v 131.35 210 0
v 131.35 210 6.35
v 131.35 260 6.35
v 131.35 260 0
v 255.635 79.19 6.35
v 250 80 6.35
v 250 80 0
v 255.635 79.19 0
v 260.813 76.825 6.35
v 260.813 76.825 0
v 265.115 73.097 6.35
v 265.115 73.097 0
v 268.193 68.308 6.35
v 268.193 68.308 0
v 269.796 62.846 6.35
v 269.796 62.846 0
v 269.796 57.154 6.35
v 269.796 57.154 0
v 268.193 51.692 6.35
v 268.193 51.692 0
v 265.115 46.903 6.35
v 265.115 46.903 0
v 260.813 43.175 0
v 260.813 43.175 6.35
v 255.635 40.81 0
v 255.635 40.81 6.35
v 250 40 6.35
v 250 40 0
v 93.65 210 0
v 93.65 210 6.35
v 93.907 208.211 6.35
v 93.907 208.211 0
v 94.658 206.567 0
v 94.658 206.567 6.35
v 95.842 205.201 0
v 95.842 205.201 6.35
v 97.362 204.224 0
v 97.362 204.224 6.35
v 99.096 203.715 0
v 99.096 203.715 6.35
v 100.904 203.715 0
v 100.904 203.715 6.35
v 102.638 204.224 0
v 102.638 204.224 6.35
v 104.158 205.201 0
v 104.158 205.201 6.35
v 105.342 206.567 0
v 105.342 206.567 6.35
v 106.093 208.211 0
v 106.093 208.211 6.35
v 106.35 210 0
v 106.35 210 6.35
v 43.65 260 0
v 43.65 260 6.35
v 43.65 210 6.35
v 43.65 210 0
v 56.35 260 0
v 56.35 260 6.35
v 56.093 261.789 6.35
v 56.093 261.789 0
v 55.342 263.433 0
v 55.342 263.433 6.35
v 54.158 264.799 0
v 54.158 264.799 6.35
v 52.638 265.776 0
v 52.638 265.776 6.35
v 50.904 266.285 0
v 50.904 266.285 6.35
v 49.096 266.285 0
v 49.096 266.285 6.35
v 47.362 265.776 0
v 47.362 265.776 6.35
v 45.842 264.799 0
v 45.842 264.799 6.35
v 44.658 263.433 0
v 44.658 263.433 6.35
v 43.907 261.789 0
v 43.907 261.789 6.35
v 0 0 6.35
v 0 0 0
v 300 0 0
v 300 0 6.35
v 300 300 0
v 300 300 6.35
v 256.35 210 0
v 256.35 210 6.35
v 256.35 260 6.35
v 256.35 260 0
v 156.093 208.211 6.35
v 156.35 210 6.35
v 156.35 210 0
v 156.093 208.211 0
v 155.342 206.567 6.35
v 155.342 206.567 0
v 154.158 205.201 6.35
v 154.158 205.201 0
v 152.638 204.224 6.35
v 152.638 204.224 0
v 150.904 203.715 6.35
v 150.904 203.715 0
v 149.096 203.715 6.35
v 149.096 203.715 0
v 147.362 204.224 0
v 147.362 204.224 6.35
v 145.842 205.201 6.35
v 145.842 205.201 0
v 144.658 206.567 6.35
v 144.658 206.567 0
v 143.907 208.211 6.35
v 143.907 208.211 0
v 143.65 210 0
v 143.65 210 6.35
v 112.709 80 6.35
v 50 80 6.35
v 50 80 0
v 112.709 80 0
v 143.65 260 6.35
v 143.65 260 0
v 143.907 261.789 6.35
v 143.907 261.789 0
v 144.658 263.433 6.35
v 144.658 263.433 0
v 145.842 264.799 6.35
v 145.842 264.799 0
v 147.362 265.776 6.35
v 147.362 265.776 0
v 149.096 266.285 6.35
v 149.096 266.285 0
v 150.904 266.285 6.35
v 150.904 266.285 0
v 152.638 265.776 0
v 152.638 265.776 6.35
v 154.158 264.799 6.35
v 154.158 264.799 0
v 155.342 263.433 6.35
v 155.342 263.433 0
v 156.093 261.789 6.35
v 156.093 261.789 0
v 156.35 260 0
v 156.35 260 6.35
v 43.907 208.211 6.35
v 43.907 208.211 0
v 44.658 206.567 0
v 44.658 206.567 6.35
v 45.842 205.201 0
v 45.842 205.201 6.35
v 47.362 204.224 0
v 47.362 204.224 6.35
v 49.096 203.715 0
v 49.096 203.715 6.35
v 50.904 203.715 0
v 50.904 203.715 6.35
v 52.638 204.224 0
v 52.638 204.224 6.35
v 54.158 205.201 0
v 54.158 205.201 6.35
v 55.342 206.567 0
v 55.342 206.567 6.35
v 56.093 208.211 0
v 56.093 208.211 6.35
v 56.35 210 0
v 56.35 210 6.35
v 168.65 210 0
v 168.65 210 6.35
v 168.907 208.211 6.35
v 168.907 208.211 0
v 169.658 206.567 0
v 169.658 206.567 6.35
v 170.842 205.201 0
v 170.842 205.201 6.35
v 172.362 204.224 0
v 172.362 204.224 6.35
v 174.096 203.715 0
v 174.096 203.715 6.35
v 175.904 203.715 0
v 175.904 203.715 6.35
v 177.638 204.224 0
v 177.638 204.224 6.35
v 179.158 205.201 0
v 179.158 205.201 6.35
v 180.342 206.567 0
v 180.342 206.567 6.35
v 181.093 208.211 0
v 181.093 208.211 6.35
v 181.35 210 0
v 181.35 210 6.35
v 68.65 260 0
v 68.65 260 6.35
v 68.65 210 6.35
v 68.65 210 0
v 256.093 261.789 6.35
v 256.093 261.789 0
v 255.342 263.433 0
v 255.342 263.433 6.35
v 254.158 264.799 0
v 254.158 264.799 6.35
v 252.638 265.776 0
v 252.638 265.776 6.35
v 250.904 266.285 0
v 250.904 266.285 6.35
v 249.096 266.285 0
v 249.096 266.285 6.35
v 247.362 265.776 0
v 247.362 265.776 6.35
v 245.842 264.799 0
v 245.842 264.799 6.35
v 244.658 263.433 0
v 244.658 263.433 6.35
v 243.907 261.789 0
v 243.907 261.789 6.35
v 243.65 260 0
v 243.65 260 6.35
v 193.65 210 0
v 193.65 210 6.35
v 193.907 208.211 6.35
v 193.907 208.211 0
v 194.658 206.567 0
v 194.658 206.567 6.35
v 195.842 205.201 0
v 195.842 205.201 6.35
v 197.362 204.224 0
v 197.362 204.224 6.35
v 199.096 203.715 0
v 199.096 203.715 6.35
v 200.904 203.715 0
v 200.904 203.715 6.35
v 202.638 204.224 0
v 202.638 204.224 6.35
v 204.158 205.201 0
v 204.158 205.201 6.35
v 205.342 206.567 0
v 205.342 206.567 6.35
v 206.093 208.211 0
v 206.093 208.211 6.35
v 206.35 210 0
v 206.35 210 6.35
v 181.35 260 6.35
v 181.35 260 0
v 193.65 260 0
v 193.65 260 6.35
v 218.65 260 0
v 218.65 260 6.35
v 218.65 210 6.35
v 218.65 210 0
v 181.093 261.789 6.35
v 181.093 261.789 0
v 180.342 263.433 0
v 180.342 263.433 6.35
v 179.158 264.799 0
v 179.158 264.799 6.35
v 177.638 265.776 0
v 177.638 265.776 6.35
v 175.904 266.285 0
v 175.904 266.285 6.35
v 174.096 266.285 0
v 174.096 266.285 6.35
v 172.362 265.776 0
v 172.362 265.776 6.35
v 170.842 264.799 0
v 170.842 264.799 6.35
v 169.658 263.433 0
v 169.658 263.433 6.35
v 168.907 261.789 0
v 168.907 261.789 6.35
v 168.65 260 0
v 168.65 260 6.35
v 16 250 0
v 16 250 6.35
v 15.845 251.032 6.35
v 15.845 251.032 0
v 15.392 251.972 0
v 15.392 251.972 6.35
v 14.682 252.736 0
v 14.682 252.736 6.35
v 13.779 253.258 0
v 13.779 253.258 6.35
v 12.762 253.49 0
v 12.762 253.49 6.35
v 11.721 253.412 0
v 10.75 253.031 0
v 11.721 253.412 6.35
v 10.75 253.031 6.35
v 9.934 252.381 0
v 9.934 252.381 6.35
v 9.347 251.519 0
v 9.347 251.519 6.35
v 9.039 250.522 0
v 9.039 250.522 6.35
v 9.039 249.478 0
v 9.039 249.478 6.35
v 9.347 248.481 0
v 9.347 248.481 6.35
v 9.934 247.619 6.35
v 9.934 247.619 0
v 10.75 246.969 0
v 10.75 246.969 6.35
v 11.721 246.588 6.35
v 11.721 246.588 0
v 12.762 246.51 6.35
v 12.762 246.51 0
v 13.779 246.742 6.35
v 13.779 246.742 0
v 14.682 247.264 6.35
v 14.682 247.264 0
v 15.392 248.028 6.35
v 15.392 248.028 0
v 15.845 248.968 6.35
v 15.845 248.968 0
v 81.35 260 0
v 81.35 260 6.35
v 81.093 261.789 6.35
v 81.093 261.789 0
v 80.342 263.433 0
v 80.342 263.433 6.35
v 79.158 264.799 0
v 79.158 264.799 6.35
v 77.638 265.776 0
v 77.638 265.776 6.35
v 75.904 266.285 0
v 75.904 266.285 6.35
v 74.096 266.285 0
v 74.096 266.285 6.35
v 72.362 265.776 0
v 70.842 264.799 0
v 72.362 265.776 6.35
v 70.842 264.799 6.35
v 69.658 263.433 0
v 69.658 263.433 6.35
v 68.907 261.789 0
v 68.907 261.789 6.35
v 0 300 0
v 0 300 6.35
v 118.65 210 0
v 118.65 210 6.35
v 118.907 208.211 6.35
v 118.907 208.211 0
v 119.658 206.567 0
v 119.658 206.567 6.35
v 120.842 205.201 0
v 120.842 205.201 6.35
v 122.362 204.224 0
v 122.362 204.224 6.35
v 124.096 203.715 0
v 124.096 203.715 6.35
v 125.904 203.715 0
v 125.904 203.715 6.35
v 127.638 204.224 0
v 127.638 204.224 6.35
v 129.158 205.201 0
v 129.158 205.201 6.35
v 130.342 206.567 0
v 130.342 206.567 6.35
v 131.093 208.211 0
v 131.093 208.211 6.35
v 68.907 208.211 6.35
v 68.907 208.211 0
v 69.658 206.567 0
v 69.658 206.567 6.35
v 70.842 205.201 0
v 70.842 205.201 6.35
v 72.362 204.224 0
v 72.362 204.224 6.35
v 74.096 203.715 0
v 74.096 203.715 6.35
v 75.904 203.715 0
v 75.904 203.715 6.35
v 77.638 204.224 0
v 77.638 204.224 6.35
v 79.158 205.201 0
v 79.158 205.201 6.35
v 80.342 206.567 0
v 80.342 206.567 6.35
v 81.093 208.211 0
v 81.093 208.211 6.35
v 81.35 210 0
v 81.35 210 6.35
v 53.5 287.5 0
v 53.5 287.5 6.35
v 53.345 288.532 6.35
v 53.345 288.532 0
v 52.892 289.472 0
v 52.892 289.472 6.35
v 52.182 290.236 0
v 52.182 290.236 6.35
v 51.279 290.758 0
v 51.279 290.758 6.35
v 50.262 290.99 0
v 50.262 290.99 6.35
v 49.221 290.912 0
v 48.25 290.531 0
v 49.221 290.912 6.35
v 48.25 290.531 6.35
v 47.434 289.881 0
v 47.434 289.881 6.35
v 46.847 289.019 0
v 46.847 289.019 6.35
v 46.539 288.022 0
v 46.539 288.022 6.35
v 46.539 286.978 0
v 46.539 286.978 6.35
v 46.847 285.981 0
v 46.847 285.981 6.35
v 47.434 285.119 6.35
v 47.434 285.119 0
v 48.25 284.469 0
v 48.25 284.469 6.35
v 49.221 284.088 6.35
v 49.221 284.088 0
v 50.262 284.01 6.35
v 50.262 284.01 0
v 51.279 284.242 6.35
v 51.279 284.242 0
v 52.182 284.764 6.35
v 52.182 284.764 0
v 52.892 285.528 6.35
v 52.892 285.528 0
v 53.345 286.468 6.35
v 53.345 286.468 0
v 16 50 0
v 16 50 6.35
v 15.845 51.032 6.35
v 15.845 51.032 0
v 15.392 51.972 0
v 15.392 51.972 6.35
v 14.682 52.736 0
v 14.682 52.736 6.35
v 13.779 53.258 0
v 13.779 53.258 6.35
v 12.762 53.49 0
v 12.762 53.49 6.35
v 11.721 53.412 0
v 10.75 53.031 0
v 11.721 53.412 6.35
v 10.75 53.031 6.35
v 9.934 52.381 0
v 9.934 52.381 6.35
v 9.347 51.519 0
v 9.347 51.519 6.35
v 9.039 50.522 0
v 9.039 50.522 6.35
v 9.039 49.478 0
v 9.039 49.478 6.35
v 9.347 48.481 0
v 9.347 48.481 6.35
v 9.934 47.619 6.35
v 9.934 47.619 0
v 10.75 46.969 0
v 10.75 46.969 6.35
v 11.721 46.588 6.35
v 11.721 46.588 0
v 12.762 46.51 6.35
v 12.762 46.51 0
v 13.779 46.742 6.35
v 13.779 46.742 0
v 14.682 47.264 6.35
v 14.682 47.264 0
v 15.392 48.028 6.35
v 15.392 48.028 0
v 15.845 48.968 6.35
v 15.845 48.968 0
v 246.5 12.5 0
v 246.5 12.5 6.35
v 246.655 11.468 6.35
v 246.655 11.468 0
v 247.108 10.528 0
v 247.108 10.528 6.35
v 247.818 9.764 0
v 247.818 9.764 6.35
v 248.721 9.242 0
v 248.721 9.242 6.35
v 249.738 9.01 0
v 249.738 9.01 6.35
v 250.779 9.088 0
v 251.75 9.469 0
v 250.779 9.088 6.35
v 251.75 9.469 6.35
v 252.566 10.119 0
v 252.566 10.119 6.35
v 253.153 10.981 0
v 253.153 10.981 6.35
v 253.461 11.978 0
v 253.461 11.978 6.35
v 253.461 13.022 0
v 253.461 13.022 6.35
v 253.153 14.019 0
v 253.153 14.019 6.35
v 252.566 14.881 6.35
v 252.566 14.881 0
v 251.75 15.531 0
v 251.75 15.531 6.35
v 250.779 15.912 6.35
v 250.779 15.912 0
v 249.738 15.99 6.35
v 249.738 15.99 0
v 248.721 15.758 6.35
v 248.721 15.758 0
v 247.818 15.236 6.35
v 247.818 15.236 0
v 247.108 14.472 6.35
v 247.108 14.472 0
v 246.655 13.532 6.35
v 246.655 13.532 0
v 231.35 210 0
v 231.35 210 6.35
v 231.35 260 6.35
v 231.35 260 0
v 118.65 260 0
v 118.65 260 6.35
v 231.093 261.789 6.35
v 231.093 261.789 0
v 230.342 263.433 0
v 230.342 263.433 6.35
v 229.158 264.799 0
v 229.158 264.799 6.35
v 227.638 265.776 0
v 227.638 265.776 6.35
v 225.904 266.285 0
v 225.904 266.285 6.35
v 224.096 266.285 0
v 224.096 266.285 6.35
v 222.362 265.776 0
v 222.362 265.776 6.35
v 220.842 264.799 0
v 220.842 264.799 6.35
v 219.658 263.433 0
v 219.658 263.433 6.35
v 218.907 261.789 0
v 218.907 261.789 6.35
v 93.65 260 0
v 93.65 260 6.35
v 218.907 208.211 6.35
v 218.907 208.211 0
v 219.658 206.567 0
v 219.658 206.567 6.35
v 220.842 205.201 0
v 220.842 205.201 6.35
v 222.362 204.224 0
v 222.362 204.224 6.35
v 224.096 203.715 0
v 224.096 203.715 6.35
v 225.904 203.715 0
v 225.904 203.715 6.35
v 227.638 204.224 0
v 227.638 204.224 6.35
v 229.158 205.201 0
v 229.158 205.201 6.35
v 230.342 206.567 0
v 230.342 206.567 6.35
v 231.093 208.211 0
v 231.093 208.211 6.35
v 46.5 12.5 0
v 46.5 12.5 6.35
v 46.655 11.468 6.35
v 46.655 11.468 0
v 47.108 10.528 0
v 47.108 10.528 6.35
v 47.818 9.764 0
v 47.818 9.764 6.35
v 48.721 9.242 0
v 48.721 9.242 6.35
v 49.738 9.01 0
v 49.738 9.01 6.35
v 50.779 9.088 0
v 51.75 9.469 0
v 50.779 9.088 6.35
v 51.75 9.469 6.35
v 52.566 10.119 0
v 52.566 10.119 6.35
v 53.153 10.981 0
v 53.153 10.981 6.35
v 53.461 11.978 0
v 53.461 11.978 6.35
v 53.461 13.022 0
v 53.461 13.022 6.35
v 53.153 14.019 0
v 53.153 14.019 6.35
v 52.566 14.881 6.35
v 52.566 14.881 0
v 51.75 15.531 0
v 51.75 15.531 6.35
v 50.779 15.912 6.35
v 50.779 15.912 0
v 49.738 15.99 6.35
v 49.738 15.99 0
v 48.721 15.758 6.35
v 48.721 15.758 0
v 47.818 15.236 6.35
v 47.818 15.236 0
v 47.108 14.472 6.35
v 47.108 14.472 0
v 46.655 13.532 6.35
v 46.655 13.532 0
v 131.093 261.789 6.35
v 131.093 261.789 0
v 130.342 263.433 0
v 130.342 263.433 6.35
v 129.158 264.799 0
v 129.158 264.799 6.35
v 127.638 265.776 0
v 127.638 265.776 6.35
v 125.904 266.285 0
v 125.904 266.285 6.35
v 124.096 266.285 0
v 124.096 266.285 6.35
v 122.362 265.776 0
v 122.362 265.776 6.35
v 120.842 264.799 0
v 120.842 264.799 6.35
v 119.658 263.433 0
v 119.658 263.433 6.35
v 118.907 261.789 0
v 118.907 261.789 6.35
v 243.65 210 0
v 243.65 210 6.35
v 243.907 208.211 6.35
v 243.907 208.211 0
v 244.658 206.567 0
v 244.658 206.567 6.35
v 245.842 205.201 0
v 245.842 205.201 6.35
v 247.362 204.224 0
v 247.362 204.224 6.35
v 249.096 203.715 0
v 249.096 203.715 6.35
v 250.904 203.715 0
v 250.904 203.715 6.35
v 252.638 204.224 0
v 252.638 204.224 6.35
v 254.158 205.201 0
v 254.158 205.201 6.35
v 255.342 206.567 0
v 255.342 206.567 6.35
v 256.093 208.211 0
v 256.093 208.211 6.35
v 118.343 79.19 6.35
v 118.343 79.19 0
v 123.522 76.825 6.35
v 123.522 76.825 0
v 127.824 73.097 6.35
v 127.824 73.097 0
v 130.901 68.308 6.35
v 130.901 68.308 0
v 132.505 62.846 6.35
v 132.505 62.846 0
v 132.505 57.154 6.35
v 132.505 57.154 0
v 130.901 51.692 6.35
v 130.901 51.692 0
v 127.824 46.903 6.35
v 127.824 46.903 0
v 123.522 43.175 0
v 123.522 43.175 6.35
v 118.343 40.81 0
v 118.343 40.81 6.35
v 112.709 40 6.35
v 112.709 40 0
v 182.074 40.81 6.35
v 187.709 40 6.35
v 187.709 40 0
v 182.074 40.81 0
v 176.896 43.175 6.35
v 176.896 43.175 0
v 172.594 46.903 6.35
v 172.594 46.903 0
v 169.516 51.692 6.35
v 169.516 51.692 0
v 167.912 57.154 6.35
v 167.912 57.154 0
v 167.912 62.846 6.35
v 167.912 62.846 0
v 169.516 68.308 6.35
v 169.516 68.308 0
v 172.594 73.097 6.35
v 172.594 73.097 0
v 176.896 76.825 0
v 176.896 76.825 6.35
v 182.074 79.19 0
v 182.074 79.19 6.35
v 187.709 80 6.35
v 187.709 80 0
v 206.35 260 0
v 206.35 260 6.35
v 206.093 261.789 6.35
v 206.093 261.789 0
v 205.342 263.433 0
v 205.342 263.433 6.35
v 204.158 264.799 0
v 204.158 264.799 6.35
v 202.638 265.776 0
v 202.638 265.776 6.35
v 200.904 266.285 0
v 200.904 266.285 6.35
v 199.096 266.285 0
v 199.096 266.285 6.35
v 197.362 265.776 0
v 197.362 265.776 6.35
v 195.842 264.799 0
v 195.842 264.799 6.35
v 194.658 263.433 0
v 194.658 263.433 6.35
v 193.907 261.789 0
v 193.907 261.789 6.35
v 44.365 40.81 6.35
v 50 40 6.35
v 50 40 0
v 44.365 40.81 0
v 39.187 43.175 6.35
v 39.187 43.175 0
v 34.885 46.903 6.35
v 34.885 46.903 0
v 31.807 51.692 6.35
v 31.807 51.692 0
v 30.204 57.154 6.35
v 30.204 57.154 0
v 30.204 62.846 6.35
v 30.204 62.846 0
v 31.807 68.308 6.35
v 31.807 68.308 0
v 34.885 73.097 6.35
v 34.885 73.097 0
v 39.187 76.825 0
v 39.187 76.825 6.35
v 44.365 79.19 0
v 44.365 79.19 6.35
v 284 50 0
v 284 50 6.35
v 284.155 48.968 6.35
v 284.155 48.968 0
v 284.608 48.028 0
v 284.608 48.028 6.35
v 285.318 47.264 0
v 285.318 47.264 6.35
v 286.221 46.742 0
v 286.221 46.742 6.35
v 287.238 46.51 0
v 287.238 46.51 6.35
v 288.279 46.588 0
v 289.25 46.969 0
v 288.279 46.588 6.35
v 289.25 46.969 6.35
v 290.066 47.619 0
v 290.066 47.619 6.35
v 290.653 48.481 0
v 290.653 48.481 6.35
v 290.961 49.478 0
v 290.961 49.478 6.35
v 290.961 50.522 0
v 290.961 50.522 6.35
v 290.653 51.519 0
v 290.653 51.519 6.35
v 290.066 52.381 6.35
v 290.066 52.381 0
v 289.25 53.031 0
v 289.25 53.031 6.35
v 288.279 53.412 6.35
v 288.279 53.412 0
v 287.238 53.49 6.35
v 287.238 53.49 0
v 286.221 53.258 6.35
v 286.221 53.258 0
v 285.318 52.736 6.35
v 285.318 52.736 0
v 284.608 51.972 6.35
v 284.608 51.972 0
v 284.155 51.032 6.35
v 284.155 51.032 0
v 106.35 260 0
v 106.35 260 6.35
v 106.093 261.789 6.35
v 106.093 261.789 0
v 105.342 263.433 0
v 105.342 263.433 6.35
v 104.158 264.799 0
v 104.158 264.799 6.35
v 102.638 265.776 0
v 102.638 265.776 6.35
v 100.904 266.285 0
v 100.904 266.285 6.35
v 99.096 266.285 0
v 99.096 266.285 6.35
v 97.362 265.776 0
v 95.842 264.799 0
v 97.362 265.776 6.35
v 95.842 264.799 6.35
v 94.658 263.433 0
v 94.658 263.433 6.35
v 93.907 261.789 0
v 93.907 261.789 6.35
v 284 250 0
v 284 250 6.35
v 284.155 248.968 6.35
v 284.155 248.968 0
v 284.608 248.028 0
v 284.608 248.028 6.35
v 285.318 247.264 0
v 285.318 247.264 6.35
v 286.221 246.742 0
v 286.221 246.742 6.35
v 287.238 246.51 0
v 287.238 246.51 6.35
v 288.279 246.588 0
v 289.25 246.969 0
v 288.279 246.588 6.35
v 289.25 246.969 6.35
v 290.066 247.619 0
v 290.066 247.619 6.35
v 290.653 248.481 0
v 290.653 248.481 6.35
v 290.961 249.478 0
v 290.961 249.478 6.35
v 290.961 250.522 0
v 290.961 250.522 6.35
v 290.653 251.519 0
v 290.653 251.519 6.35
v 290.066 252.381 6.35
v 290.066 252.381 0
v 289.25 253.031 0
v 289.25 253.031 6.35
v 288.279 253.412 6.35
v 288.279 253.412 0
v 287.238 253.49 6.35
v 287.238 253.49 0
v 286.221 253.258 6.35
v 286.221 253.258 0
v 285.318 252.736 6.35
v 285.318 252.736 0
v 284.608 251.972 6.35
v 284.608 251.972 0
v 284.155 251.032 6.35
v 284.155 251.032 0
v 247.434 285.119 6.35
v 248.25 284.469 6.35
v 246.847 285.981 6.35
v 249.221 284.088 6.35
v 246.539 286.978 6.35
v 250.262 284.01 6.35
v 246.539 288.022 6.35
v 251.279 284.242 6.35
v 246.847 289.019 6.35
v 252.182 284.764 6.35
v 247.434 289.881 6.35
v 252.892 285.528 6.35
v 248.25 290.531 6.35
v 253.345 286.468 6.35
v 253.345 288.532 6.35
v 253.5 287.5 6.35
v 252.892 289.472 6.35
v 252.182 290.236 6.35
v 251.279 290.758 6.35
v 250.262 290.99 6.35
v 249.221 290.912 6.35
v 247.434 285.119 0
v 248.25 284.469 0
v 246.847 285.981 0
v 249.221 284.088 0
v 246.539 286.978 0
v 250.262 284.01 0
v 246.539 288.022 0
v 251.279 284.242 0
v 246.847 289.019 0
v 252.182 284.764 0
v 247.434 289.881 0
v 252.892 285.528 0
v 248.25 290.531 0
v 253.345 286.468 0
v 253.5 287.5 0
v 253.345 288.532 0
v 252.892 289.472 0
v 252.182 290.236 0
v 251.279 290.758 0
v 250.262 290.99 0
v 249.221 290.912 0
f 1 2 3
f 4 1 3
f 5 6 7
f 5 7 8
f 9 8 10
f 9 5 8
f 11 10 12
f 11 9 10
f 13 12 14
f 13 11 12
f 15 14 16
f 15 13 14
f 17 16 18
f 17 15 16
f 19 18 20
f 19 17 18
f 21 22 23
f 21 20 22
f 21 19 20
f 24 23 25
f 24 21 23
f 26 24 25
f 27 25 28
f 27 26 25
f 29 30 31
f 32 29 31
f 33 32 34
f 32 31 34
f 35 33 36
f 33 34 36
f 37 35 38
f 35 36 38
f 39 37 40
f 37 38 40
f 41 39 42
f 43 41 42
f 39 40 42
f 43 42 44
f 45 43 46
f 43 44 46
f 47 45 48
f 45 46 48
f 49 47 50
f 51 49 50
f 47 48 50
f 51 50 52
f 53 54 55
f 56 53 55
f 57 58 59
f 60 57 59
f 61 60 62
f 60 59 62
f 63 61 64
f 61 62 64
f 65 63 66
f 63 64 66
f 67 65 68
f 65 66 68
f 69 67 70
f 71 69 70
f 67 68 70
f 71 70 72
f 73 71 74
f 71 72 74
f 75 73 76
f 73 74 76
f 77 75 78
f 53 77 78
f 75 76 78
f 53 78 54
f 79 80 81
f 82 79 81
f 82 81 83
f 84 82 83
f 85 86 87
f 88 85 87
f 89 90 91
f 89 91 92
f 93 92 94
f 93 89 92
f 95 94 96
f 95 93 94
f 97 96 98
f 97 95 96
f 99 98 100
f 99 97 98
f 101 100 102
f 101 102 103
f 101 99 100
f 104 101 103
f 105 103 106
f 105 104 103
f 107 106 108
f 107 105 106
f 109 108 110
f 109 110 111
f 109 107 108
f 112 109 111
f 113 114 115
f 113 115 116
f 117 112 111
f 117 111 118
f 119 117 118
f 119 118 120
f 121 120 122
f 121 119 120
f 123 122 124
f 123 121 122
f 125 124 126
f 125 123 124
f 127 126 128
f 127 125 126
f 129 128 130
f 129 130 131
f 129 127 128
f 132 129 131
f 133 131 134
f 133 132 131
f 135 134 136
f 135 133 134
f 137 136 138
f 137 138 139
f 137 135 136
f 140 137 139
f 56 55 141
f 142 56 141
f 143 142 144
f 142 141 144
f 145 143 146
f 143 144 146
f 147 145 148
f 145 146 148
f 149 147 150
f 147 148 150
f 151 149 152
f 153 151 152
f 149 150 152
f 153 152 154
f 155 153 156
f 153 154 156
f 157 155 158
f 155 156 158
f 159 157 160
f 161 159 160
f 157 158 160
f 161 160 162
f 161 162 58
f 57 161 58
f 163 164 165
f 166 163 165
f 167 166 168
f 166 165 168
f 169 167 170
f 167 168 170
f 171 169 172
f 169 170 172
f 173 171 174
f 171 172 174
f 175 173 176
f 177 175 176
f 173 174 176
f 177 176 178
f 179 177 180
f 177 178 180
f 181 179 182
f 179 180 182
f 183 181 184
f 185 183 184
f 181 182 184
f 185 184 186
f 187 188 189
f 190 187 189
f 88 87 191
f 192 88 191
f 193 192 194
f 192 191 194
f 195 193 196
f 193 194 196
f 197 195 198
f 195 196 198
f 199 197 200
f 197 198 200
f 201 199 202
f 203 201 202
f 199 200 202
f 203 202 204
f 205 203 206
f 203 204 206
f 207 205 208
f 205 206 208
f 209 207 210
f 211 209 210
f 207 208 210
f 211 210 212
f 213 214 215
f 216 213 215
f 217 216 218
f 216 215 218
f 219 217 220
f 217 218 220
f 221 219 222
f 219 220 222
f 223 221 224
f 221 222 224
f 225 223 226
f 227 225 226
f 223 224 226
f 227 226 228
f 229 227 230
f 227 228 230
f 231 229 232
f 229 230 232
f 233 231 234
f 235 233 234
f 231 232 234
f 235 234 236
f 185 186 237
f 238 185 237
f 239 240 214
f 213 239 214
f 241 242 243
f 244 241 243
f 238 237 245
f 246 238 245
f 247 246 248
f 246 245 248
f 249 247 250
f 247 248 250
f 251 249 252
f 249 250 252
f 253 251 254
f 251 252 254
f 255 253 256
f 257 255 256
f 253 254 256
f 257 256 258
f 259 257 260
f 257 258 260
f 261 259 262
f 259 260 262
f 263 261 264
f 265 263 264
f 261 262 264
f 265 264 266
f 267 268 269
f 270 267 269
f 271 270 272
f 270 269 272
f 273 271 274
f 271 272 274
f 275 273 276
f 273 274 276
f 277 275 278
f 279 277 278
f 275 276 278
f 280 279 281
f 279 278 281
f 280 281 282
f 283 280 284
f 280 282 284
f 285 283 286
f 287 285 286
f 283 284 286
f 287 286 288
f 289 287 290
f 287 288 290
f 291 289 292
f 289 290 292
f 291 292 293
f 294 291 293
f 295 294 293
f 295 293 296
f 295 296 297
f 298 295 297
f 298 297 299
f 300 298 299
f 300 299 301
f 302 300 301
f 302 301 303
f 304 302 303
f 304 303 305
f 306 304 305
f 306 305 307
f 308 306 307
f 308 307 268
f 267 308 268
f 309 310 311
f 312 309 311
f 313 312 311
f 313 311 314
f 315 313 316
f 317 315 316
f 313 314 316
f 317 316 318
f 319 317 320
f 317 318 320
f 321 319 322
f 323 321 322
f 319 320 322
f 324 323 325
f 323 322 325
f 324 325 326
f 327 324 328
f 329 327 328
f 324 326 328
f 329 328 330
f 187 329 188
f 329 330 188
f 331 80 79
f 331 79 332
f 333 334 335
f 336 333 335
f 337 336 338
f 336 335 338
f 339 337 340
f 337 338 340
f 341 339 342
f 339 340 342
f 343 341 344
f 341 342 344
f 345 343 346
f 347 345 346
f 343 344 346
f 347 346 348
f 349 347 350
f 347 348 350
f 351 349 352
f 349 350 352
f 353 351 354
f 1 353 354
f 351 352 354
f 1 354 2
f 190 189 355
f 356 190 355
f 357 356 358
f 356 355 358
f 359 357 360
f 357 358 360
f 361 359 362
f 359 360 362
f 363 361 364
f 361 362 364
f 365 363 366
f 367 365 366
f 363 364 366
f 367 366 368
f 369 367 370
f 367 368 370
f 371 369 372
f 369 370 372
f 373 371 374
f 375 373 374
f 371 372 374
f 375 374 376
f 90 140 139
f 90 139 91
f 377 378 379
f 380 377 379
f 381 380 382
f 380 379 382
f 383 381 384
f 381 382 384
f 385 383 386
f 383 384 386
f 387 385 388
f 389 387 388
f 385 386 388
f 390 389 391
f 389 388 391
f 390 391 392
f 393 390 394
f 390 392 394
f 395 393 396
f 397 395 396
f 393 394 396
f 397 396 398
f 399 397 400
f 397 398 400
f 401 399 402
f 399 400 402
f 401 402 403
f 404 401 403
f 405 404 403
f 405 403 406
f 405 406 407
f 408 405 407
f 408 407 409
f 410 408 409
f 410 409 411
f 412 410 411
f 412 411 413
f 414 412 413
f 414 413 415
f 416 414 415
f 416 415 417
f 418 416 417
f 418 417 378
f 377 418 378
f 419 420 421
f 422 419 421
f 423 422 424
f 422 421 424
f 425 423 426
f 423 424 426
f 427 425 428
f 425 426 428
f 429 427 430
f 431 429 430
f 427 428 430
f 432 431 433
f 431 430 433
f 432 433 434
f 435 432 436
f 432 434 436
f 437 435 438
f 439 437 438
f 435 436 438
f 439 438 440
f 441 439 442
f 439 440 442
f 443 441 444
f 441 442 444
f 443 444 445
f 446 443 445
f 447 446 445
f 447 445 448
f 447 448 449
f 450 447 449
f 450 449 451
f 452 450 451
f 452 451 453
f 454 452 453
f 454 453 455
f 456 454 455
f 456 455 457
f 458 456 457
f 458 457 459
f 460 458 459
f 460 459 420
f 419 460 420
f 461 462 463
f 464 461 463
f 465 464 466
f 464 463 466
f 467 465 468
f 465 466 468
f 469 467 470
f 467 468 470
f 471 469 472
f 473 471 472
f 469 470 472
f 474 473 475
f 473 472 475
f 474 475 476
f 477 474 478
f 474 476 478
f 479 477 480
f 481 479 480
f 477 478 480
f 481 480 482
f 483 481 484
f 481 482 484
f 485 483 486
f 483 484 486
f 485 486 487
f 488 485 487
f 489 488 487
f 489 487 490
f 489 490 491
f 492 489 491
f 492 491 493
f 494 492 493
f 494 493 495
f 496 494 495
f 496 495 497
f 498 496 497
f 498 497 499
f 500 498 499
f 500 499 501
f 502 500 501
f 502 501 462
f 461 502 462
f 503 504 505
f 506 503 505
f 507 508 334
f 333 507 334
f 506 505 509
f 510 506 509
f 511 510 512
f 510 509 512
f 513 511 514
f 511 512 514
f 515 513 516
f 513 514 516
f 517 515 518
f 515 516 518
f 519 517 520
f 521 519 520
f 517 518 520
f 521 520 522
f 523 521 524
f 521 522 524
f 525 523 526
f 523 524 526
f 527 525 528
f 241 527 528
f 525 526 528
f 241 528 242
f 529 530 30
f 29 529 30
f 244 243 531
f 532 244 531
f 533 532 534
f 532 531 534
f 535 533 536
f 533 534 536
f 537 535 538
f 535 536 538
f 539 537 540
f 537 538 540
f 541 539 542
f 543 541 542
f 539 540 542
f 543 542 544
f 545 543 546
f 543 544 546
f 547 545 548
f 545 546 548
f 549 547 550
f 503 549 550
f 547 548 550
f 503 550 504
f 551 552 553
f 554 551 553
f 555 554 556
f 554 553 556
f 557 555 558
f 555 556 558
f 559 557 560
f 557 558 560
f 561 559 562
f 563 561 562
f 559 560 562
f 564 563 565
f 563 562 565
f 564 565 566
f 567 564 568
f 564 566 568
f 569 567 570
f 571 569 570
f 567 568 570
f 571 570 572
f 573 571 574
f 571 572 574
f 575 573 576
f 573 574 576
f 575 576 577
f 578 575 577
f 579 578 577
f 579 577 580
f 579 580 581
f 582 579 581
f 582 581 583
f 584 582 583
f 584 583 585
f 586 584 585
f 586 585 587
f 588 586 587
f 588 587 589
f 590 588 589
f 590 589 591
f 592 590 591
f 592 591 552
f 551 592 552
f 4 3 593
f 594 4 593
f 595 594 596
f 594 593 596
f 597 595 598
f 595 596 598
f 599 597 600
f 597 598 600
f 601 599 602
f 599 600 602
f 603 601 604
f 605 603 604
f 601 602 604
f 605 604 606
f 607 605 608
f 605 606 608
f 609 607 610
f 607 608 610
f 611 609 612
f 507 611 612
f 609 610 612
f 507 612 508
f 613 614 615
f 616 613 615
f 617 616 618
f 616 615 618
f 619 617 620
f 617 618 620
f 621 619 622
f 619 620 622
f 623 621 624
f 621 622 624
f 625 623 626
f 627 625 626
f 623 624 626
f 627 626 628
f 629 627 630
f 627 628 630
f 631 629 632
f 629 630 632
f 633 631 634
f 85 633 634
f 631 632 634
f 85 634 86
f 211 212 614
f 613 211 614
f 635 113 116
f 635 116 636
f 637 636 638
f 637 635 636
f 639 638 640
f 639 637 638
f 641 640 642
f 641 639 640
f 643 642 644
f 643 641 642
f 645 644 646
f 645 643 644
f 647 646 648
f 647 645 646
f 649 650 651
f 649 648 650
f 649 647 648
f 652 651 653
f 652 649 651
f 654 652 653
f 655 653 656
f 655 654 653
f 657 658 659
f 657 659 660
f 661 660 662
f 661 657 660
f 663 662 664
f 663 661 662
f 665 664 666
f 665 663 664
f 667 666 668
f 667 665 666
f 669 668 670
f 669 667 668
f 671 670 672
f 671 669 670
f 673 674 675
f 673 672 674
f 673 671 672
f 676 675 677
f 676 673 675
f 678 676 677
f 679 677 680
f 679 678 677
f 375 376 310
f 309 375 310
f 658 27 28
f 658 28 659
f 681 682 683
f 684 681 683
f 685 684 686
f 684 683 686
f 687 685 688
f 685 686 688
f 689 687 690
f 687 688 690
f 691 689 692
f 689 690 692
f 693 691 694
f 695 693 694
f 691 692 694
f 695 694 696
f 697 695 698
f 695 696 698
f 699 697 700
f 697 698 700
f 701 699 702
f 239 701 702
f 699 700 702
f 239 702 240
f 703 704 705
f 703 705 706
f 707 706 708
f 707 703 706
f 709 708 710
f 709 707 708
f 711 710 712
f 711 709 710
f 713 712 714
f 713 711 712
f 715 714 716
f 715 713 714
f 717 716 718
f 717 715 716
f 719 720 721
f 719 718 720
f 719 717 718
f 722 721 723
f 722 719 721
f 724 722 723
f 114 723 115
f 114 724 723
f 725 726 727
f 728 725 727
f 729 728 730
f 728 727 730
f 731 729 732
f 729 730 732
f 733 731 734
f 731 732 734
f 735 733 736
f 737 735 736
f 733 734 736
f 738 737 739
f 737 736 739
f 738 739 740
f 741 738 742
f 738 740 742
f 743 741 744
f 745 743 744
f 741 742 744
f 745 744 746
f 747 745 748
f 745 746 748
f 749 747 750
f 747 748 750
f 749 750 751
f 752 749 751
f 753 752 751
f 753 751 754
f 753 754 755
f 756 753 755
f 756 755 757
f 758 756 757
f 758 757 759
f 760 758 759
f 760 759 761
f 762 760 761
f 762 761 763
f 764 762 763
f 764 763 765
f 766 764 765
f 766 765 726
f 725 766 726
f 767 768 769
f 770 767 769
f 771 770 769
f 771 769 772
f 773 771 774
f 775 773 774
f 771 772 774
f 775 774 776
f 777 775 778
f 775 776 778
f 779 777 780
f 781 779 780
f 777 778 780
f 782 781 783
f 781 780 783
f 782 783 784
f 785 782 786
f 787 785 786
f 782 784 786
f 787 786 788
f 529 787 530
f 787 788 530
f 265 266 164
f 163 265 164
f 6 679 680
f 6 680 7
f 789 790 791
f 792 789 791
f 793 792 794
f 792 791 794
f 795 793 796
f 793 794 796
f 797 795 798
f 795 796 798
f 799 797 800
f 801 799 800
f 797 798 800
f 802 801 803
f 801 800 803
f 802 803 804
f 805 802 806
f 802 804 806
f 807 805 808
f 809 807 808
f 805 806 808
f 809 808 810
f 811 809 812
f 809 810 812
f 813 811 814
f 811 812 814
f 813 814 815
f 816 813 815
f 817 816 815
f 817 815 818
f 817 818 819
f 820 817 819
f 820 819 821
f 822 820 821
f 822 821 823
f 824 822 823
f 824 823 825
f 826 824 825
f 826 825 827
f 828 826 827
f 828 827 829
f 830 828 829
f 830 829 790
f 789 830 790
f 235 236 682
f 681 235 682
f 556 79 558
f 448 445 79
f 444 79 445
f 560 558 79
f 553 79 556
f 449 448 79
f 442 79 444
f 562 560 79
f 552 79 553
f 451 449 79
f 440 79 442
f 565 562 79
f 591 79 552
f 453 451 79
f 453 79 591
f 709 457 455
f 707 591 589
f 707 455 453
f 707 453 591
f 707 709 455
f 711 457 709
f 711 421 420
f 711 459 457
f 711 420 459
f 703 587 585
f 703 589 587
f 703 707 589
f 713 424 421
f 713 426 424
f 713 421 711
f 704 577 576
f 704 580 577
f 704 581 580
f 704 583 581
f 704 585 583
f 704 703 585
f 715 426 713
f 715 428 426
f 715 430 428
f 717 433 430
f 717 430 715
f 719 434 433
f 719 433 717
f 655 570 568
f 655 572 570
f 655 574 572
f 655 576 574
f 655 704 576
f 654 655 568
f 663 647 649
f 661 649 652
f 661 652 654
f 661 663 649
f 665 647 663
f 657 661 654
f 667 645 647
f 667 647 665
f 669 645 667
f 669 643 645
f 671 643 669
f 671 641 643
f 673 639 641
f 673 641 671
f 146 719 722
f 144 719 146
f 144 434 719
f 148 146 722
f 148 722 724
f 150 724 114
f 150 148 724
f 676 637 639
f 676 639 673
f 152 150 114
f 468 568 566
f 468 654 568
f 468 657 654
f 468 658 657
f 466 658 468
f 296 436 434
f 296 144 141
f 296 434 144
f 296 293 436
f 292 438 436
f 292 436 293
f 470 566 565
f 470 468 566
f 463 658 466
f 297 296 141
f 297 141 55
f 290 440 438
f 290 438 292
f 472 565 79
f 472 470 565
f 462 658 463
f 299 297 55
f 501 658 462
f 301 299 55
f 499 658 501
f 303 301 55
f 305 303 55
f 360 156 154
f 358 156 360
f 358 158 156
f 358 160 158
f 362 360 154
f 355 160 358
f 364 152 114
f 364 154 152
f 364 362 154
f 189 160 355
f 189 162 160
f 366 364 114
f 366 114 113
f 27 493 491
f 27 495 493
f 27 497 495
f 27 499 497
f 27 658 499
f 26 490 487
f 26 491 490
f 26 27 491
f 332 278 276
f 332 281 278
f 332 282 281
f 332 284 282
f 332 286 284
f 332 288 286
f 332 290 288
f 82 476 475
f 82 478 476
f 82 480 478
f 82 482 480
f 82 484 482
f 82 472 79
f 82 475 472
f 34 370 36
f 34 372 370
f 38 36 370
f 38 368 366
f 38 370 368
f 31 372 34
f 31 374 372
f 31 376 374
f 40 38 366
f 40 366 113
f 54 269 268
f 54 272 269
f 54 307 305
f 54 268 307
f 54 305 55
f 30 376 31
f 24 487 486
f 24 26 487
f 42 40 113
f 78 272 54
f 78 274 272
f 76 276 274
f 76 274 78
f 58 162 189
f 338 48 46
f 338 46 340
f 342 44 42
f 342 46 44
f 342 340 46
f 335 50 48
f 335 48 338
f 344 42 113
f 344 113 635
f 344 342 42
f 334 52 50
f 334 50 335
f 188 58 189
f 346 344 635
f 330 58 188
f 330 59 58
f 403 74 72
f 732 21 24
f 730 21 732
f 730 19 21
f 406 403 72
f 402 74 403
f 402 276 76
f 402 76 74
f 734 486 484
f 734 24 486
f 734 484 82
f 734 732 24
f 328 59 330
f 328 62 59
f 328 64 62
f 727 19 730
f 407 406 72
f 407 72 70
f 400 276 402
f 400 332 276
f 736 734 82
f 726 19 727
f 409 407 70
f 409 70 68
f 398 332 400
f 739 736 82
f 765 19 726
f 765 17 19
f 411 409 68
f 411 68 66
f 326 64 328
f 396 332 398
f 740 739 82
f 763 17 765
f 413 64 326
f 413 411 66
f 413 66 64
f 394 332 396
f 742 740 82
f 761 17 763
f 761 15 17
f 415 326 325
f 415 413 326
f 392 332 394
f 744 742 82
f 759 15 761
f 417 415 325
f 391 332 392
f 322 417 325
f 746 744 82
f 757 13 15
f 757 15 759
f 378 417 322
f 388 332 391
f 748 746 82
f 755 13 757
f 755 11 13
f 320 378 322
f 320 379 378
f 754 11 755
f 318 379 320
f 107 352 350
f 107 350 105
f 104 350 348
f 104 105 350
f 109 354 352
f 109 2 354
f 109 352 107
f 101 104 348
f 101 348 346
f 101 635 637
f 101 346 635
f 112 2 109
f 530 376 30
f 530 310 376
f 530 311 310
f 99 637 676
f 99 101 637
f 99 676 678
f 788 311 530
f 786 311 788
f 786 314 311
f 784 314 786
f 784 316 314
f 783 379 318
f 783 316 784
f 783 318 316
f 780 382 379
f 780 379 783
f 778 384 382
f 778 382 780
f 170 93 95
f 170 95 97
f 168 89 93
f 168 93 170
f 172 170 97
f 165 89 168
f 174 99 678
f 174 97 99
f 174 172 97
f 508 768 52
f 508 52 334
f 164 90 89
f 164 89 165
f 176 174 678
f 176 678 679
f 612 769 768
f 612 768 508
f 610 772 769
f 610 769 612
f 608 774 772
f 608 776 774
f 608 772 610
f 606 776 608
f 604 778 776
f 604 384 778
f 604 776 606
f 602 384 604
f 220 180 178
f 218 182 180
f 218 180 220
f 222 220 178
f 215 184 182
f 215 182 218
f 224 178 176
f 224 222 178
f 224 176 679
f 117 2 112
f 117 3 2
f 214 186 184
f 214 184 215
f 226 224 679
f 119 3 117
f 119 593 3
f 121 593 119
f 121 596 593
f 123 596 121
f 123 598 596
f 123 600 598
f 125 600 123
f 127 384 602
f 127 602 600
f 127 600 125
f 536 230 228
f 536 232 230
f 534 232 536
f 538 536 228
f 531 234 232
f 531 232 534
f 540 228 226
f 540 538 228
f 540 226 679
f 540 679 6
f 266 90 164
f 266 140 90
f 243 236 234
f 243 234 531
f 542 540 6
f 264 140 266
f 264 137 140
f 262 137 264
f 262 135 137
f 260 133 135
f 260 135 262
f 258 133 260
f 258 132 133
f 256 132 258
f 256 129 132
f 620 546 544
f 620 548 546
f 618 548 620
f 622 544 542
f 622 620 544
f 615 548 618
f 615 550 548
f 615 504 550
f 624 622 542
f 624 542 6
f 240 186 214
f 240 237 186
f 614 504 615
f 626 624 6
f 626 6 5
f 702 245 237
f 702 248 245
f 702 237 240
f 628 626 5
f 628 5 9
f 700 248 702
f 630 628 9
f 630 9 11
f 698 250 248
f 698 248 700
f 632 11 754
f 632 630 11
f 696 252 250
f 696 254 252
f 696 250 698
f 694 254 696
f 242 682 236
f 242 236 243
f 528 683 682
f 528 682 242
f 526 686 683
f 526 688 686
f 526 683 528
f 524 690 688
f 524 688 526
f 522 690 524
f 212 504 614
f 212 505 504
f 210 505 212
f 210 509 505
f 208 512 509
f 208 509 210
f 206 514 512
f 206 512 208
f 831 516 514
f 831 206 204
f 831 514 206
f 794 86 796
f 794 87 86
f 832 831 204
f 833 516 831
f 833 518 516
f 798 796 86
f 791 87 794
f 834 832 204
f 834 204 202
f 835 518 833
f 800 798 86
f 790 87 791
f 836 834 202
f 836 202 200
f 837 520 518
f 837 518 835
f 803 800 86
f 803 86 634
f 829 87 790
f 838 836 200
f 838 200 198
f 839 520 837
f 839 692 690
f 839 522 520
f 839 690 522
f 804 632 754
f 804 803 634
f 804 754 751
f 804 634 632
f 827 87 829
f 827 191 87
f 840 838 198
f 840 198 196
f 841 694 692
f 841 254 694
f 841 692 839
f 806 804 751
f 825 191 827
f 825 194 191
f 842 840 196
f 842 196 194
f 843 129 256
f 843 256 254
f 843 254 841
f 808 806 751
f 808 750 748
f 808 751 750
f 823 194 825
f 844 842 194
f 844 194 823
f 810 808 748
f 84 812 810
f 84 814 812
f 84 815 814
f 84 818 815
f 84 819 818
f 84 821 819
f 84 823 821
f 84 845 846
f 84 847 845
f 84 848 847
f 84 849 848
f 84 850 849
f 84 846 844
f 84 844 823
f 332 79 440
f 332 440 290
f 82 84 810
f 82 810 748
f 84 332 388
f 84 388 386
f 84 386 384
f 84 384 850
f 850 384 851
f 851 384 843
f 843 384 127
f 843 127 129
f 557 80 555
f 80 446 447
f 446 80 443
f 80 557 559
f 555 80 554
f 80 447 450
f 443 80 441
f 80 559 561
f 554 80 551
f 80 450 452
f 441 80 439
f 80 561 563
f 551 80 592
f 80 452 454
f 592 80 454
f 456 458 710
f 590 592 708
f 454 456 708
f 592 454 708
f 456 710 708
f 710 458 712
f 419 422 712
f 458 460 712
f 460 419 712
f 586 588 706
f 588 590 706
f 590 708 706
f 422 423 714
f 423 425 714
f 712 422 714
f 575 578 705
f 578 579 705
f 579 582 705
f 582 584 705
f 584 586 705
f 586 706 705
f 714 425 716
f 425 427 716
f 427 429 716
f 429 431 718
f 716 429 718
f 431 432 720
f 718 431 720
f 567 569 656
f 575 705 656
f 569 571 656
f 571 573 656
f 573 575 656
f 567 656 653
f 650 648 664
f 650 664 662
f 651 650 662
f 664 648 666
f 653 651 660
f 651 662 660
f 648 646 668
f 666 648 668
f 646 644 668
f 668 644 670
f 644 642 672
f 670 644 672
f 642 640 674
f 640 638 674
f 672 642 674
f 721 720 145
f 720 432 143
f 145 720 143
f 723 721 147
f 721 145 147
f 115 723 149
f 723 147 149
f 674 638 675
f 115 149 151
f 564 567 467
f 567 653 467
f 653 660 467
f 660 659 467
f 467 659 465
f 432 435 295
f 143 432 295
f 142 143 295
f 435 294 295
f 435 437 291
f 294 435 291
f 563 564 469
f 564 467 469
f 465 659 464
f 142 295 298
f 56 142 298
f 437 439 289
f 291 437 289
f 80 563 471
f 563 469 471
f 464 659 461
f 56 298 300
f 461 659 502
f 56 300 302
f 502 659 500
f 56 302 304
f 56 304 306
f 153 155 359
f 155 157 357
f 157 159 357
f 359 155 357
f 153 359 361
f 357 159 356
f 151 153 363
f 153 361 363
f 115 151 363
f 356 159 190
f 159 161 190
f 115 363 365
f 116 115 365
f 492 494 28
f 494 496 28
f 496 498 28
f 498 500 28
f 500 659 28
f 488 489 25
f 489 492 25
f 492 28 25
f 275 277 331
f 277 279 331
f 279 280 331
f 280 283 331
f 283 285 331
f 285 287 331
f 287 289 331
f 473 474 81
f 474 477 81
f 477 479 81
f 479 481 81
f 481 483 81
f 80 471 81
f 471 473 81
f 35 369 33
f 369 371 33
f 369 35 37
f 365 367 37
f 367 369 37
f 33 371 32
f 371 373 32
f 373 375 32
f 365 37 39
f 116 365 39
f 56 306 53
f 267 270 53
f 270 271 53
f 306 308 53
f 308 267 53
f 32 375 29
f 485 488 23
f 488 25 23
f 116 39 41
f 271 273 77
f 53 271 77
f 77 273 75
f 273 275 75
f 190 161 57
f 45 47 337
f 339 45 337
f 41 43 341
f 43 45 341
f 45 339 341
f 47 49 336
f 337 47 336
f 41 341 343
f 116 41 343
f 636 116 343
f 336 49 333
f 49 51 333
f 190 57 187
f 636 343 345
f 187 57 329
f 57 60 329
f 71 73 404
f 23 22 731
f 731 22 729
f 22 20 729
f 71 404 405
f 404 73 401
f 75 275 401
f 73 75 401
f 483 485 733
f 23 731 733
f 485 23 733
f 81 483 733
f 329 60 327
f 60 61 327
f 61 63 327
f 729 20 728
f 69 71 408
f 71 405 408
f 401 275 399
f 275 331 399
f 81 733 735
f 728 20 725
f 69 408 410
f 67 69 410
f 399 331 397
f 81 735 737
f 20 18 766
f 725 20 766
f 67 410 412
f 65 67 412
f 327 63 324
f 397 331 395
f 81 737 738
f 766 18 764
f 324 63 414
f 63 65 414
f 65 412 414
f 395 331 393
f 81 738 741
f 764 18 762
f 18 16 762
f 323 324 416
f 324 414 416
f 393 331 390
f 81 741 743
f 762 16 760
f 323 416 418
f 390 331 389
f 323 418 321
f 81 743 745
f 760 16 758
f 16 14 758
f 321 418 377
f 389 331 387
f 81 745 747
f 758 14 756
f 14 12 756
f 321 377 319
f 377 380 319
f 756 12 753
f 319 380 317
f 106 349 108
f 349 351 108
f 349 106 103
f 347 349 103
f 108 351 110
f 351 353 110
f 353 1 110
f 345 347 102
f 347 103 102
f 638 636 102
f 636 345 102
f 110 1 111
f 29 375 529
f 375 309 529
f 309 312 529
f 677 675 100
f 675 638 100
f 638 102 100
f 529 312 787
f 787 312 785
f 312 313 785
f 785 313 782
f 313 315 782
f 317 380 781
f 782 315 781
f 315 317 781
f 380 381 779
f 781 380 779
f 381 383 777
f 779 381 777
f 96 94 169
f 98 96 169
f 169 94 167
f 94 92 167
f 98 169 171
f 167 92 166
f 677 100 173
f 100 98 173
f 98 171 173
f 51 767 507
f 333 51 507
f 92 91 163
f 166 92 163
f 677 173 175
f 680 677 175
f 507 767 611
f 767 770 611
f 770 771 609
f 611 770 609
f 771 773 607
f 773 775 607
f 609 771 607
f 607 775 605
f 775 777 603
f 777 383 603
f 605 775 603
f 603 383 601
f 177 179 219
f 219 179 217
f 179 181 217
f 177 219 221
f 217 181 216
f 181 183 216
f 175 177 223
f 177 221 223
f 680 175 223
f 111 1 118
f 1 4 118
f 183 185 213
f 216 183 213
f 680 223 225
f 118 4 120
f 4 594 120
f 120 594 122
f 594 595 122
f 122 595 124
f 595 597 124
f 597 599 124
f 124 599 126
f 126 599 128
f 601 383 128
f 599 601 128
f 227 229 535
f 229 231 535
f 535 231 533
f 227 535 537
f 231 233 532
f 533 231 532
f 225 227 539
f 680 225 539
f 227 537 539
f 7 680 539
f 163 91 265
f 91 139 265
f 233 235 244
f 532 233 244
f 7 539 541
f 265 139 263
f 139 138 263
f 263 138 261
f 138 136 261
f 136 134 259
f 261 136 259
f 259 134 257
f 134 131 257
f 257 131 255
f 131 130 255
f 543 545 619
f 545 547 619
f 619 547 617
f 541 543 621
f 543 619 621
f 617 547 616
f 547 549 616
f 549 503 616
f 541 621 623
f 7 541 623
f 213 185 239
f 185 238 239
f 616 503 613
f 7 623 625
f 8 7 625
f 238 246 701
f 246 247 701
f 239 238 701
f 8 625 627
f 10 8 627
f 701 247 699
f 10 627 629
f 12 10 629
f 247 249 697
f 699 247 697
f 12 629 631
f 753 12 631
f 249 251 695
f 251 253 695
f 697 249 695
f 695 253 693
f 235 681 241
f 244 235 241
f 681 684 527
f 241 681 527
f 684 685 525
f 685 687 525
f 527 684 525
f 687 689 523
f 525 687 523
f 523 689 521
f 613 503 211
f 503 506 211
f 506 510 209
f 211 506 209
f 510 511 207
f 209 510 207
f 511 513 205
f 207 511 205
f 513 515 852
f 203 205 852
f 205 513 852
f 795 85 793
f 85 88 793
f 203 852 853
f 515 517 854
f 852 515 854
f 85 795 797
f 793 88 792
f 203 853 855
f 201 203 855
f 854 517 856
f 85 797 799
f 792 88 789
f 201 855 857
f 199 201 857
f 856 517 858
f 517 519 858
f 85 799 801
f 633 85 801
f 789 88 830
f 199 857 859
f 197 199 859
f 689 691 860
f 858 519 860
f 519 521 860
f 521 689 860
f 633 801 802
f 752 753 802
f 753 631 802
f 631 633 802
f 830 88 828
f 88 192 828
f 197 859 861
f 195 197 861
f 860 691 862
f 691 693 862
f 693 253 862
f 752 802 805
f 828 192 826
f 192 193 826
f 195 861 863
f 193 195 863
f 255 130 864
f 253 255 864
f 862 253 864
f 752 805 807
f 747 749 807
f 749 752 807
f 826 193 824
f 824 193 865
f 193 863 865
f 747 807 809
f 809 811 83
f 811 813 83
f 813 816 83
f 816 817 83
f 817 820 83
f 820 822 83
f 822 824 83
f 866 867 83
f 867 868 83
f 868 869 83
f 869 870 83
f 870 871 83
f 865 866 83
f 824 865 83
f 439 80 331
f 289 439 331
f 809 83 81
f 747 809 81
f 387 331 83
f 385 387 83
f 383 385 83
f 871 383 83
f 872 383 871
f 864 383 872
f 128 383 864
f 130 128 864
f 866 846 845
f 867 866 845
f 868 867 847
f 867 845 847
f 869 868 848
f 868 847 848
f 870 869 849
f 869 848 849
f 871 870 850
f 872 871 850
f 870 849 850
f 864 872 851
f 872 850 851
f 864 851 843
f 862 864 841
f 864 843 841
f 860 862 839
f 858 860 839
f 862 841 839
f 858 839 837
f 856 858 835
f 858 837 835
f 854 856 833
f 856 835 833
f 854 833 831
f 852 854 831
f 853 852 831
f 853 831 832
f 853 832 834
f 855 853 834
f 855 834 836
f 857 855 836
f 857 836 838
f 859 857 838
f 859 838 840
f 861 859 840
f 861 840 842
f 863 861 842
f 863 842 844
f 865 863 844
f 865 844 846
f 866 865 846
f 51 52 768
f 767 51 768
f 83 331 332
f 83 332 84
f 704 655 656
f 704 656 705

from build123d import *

# Parameters (mm, degrees)
SKETCH1_W           = 300
SKETCH1_H           = 300
BOSS_EXTRUDE1_DEPTH = 6.35
CUT_EXTRUDE1_DEPTH  = 6.35
CUT_EXTRUDE2_DEPTH  = 425.311586573
SKETCH4_R           = 3.5
CUT_EXTRUDE3_DEPTH  = 10


with BuildPart() as part:
    # Sketch1 → Boss-Extrude1 (new body)
    with BuildSketch(Plane.XY):
        with Locations((150, 150)):
            Rectangle(SKETCH1_W, SKETCH1_H)
    extrude(amount=BOSS_EXTRUDE1_DEPTH)

    # Sketch2 → Cut-Extrude1 (cut)
    with BuildSketch(Plane.XY.offset(6.35)):
        with BuildLine():
            Line((143.65, 210), (143.65, 260))
            ThreePointArc((143.65, 260), (150, 266.35), (156.35, 260))
            Line((156.35, 260), (156.35, 210))
            ThreePointArc((156.35, 210), (150, 203.65), (143.65, 210))
        make_face()
        with BuildLine():
            Line((181.35, 210), (181.35, 260))
            ThreePointArc((181.35, 260), (175, 266.35), (168.65, 260))
            Line((168.65, 260), (168.65, 210))
            ThreePointArc((168.65, 210), (175, 203.65), (181.35, 210))
        make_face()
        with BuildLine():
            Line((206.35, 210), (206.35, 260))
            ThreePointArc((206.35, 260), (200, 266.35), (193.65, 260))
            Line((193.65, 260), (193.65, 210))
            ThreePointArc((193.65, 210), (200, 203.65), (206.35, 210))
        make_face()
        with BuildLine():
            Line((231.35, 210), (231.35, 260))
            ThreePointArc((231.35, 260), (225, 266.35), (218.65, 260))
            Line((218.65, 260), (218.65, 210))
            ThreePointArc((218.65, 210), (225, 203.65), (231.35, 210))
        make_face()
        with BuildLine():
            Line((256.35, 210), (256.35, 260))
            ThreePointArc((256.35, 260), (250, 266.35), (243.65, 260))
            Line((243.65, 260), (243.65, 210))
            ThreePointArc((243.65, 210), (250, 203.65), (256.35, 210))
        make_face()
        with BuildLine():
            Line((131.35, 210), (131.35, 260))
            ThreePointArc((131.35, 260), (125, 266.35), (118.65, 260))
            Line((118.65, 260), (118.65, 210))
            ThreePointArc((118.65, 210), (125, 203.65), (131.35, 210))
        make_face()
        with BuildLine():
            Line((106.35, 210), (106.35, 260))
            ThreePointArc((106.35, 260), (100, 266.35), (93.65, 260))
            Line((93.65, 260), (93.65, 210))
            ThreePointArc((93.65, 210), (100, 203.65), (106.35, 210))
        make_face()
        with BuildLine():
            Line((81.35, 210), (81.35, 260))
            ThreePointArc((81.35, 260), (75, 266.35), (68.65, 260))
            Line((68.65, 260), (68.65, 210))
            ThreePointArc((68.65, 210), (75, 203.65), (81.35, 210))
        make_face()
        with BuildLine():
            Line((56.35, 210), (56.35, 260))
            ThreePointArc((56.35, 260), (50, 266.35), (43.65, 260))
            Line((43.65, 260), (43.65, 210))
            ThreePointArc((43.65, 210), (50, 203.65), (56.35, 210))
        make_face()
    extrude(amount=-CUT_EXTRUDE1_DEPTH, mode=Mode.SUBTRACT)

    # Sketch3 → Cut-Extrude2 (cut, through all)
    with BuildSketch(Plane.XY.offset(6.35)):
        with BuildLine():
            Line((50, 80), (112.708755261, 80))
            ThreePointArc((112.708755261, 80), (132.708755261, 60), (112.708755261, 40))
            Line((112.708755261, 40), (50, 40))
            ThreePointArc((50, 40), (30, 60), (50, 80))
        make_face()
        with BuildLine():
            Line((250, 40), (187.708755261, 40))
            ThreePointArc((187.708755261, 40), (167.708755261, 60), (187.708755261, 80))
            Line((187.708755261, 80), (250, 80))
            ThreePointArc((250, 80), (270, 60), (250, 40))
        make_face()
    extrude(amount=-CUT_EXTRUDE2_DEPTH, mode=Mode.SUBTRACT)

    # Sketch4 → Cut-Extrude3 (cut)
    with BuildSketch(Plane.XY.offset(6.35)):
        with Locations((50, 287.5)):
            Circle(SKETCH4_R)
        with Locations((250, 287.5)):
            Circle(SKETCH4_R)
        with Locations((12.5, 50)):
            Circle(SKETCH4_R)
        with Locations((12.5, 250)):
            Circle(SKETCH4_R)
        with Locations(Location((287.5, 50, 0), (0, 0, 180))):
            Circle(SKETCH4_R)
        with Locations(Location((287.5, 250, 0), (0, 0, 180))):
            Circle(SKETCH4_R)
        with Locations(Location((250, 12.5, 0), (0, 0, 180))):
            Circle(SKETCH4_R)
        with Locations(Location((50, 12.5, 0), (0, 0, 180))):
            Circle(SKETCH4_R)
    extrude(amount=-CUT_EXTRUDE3_DEPTH, mode=Mode.SUBTRACT)


solid = part.part
